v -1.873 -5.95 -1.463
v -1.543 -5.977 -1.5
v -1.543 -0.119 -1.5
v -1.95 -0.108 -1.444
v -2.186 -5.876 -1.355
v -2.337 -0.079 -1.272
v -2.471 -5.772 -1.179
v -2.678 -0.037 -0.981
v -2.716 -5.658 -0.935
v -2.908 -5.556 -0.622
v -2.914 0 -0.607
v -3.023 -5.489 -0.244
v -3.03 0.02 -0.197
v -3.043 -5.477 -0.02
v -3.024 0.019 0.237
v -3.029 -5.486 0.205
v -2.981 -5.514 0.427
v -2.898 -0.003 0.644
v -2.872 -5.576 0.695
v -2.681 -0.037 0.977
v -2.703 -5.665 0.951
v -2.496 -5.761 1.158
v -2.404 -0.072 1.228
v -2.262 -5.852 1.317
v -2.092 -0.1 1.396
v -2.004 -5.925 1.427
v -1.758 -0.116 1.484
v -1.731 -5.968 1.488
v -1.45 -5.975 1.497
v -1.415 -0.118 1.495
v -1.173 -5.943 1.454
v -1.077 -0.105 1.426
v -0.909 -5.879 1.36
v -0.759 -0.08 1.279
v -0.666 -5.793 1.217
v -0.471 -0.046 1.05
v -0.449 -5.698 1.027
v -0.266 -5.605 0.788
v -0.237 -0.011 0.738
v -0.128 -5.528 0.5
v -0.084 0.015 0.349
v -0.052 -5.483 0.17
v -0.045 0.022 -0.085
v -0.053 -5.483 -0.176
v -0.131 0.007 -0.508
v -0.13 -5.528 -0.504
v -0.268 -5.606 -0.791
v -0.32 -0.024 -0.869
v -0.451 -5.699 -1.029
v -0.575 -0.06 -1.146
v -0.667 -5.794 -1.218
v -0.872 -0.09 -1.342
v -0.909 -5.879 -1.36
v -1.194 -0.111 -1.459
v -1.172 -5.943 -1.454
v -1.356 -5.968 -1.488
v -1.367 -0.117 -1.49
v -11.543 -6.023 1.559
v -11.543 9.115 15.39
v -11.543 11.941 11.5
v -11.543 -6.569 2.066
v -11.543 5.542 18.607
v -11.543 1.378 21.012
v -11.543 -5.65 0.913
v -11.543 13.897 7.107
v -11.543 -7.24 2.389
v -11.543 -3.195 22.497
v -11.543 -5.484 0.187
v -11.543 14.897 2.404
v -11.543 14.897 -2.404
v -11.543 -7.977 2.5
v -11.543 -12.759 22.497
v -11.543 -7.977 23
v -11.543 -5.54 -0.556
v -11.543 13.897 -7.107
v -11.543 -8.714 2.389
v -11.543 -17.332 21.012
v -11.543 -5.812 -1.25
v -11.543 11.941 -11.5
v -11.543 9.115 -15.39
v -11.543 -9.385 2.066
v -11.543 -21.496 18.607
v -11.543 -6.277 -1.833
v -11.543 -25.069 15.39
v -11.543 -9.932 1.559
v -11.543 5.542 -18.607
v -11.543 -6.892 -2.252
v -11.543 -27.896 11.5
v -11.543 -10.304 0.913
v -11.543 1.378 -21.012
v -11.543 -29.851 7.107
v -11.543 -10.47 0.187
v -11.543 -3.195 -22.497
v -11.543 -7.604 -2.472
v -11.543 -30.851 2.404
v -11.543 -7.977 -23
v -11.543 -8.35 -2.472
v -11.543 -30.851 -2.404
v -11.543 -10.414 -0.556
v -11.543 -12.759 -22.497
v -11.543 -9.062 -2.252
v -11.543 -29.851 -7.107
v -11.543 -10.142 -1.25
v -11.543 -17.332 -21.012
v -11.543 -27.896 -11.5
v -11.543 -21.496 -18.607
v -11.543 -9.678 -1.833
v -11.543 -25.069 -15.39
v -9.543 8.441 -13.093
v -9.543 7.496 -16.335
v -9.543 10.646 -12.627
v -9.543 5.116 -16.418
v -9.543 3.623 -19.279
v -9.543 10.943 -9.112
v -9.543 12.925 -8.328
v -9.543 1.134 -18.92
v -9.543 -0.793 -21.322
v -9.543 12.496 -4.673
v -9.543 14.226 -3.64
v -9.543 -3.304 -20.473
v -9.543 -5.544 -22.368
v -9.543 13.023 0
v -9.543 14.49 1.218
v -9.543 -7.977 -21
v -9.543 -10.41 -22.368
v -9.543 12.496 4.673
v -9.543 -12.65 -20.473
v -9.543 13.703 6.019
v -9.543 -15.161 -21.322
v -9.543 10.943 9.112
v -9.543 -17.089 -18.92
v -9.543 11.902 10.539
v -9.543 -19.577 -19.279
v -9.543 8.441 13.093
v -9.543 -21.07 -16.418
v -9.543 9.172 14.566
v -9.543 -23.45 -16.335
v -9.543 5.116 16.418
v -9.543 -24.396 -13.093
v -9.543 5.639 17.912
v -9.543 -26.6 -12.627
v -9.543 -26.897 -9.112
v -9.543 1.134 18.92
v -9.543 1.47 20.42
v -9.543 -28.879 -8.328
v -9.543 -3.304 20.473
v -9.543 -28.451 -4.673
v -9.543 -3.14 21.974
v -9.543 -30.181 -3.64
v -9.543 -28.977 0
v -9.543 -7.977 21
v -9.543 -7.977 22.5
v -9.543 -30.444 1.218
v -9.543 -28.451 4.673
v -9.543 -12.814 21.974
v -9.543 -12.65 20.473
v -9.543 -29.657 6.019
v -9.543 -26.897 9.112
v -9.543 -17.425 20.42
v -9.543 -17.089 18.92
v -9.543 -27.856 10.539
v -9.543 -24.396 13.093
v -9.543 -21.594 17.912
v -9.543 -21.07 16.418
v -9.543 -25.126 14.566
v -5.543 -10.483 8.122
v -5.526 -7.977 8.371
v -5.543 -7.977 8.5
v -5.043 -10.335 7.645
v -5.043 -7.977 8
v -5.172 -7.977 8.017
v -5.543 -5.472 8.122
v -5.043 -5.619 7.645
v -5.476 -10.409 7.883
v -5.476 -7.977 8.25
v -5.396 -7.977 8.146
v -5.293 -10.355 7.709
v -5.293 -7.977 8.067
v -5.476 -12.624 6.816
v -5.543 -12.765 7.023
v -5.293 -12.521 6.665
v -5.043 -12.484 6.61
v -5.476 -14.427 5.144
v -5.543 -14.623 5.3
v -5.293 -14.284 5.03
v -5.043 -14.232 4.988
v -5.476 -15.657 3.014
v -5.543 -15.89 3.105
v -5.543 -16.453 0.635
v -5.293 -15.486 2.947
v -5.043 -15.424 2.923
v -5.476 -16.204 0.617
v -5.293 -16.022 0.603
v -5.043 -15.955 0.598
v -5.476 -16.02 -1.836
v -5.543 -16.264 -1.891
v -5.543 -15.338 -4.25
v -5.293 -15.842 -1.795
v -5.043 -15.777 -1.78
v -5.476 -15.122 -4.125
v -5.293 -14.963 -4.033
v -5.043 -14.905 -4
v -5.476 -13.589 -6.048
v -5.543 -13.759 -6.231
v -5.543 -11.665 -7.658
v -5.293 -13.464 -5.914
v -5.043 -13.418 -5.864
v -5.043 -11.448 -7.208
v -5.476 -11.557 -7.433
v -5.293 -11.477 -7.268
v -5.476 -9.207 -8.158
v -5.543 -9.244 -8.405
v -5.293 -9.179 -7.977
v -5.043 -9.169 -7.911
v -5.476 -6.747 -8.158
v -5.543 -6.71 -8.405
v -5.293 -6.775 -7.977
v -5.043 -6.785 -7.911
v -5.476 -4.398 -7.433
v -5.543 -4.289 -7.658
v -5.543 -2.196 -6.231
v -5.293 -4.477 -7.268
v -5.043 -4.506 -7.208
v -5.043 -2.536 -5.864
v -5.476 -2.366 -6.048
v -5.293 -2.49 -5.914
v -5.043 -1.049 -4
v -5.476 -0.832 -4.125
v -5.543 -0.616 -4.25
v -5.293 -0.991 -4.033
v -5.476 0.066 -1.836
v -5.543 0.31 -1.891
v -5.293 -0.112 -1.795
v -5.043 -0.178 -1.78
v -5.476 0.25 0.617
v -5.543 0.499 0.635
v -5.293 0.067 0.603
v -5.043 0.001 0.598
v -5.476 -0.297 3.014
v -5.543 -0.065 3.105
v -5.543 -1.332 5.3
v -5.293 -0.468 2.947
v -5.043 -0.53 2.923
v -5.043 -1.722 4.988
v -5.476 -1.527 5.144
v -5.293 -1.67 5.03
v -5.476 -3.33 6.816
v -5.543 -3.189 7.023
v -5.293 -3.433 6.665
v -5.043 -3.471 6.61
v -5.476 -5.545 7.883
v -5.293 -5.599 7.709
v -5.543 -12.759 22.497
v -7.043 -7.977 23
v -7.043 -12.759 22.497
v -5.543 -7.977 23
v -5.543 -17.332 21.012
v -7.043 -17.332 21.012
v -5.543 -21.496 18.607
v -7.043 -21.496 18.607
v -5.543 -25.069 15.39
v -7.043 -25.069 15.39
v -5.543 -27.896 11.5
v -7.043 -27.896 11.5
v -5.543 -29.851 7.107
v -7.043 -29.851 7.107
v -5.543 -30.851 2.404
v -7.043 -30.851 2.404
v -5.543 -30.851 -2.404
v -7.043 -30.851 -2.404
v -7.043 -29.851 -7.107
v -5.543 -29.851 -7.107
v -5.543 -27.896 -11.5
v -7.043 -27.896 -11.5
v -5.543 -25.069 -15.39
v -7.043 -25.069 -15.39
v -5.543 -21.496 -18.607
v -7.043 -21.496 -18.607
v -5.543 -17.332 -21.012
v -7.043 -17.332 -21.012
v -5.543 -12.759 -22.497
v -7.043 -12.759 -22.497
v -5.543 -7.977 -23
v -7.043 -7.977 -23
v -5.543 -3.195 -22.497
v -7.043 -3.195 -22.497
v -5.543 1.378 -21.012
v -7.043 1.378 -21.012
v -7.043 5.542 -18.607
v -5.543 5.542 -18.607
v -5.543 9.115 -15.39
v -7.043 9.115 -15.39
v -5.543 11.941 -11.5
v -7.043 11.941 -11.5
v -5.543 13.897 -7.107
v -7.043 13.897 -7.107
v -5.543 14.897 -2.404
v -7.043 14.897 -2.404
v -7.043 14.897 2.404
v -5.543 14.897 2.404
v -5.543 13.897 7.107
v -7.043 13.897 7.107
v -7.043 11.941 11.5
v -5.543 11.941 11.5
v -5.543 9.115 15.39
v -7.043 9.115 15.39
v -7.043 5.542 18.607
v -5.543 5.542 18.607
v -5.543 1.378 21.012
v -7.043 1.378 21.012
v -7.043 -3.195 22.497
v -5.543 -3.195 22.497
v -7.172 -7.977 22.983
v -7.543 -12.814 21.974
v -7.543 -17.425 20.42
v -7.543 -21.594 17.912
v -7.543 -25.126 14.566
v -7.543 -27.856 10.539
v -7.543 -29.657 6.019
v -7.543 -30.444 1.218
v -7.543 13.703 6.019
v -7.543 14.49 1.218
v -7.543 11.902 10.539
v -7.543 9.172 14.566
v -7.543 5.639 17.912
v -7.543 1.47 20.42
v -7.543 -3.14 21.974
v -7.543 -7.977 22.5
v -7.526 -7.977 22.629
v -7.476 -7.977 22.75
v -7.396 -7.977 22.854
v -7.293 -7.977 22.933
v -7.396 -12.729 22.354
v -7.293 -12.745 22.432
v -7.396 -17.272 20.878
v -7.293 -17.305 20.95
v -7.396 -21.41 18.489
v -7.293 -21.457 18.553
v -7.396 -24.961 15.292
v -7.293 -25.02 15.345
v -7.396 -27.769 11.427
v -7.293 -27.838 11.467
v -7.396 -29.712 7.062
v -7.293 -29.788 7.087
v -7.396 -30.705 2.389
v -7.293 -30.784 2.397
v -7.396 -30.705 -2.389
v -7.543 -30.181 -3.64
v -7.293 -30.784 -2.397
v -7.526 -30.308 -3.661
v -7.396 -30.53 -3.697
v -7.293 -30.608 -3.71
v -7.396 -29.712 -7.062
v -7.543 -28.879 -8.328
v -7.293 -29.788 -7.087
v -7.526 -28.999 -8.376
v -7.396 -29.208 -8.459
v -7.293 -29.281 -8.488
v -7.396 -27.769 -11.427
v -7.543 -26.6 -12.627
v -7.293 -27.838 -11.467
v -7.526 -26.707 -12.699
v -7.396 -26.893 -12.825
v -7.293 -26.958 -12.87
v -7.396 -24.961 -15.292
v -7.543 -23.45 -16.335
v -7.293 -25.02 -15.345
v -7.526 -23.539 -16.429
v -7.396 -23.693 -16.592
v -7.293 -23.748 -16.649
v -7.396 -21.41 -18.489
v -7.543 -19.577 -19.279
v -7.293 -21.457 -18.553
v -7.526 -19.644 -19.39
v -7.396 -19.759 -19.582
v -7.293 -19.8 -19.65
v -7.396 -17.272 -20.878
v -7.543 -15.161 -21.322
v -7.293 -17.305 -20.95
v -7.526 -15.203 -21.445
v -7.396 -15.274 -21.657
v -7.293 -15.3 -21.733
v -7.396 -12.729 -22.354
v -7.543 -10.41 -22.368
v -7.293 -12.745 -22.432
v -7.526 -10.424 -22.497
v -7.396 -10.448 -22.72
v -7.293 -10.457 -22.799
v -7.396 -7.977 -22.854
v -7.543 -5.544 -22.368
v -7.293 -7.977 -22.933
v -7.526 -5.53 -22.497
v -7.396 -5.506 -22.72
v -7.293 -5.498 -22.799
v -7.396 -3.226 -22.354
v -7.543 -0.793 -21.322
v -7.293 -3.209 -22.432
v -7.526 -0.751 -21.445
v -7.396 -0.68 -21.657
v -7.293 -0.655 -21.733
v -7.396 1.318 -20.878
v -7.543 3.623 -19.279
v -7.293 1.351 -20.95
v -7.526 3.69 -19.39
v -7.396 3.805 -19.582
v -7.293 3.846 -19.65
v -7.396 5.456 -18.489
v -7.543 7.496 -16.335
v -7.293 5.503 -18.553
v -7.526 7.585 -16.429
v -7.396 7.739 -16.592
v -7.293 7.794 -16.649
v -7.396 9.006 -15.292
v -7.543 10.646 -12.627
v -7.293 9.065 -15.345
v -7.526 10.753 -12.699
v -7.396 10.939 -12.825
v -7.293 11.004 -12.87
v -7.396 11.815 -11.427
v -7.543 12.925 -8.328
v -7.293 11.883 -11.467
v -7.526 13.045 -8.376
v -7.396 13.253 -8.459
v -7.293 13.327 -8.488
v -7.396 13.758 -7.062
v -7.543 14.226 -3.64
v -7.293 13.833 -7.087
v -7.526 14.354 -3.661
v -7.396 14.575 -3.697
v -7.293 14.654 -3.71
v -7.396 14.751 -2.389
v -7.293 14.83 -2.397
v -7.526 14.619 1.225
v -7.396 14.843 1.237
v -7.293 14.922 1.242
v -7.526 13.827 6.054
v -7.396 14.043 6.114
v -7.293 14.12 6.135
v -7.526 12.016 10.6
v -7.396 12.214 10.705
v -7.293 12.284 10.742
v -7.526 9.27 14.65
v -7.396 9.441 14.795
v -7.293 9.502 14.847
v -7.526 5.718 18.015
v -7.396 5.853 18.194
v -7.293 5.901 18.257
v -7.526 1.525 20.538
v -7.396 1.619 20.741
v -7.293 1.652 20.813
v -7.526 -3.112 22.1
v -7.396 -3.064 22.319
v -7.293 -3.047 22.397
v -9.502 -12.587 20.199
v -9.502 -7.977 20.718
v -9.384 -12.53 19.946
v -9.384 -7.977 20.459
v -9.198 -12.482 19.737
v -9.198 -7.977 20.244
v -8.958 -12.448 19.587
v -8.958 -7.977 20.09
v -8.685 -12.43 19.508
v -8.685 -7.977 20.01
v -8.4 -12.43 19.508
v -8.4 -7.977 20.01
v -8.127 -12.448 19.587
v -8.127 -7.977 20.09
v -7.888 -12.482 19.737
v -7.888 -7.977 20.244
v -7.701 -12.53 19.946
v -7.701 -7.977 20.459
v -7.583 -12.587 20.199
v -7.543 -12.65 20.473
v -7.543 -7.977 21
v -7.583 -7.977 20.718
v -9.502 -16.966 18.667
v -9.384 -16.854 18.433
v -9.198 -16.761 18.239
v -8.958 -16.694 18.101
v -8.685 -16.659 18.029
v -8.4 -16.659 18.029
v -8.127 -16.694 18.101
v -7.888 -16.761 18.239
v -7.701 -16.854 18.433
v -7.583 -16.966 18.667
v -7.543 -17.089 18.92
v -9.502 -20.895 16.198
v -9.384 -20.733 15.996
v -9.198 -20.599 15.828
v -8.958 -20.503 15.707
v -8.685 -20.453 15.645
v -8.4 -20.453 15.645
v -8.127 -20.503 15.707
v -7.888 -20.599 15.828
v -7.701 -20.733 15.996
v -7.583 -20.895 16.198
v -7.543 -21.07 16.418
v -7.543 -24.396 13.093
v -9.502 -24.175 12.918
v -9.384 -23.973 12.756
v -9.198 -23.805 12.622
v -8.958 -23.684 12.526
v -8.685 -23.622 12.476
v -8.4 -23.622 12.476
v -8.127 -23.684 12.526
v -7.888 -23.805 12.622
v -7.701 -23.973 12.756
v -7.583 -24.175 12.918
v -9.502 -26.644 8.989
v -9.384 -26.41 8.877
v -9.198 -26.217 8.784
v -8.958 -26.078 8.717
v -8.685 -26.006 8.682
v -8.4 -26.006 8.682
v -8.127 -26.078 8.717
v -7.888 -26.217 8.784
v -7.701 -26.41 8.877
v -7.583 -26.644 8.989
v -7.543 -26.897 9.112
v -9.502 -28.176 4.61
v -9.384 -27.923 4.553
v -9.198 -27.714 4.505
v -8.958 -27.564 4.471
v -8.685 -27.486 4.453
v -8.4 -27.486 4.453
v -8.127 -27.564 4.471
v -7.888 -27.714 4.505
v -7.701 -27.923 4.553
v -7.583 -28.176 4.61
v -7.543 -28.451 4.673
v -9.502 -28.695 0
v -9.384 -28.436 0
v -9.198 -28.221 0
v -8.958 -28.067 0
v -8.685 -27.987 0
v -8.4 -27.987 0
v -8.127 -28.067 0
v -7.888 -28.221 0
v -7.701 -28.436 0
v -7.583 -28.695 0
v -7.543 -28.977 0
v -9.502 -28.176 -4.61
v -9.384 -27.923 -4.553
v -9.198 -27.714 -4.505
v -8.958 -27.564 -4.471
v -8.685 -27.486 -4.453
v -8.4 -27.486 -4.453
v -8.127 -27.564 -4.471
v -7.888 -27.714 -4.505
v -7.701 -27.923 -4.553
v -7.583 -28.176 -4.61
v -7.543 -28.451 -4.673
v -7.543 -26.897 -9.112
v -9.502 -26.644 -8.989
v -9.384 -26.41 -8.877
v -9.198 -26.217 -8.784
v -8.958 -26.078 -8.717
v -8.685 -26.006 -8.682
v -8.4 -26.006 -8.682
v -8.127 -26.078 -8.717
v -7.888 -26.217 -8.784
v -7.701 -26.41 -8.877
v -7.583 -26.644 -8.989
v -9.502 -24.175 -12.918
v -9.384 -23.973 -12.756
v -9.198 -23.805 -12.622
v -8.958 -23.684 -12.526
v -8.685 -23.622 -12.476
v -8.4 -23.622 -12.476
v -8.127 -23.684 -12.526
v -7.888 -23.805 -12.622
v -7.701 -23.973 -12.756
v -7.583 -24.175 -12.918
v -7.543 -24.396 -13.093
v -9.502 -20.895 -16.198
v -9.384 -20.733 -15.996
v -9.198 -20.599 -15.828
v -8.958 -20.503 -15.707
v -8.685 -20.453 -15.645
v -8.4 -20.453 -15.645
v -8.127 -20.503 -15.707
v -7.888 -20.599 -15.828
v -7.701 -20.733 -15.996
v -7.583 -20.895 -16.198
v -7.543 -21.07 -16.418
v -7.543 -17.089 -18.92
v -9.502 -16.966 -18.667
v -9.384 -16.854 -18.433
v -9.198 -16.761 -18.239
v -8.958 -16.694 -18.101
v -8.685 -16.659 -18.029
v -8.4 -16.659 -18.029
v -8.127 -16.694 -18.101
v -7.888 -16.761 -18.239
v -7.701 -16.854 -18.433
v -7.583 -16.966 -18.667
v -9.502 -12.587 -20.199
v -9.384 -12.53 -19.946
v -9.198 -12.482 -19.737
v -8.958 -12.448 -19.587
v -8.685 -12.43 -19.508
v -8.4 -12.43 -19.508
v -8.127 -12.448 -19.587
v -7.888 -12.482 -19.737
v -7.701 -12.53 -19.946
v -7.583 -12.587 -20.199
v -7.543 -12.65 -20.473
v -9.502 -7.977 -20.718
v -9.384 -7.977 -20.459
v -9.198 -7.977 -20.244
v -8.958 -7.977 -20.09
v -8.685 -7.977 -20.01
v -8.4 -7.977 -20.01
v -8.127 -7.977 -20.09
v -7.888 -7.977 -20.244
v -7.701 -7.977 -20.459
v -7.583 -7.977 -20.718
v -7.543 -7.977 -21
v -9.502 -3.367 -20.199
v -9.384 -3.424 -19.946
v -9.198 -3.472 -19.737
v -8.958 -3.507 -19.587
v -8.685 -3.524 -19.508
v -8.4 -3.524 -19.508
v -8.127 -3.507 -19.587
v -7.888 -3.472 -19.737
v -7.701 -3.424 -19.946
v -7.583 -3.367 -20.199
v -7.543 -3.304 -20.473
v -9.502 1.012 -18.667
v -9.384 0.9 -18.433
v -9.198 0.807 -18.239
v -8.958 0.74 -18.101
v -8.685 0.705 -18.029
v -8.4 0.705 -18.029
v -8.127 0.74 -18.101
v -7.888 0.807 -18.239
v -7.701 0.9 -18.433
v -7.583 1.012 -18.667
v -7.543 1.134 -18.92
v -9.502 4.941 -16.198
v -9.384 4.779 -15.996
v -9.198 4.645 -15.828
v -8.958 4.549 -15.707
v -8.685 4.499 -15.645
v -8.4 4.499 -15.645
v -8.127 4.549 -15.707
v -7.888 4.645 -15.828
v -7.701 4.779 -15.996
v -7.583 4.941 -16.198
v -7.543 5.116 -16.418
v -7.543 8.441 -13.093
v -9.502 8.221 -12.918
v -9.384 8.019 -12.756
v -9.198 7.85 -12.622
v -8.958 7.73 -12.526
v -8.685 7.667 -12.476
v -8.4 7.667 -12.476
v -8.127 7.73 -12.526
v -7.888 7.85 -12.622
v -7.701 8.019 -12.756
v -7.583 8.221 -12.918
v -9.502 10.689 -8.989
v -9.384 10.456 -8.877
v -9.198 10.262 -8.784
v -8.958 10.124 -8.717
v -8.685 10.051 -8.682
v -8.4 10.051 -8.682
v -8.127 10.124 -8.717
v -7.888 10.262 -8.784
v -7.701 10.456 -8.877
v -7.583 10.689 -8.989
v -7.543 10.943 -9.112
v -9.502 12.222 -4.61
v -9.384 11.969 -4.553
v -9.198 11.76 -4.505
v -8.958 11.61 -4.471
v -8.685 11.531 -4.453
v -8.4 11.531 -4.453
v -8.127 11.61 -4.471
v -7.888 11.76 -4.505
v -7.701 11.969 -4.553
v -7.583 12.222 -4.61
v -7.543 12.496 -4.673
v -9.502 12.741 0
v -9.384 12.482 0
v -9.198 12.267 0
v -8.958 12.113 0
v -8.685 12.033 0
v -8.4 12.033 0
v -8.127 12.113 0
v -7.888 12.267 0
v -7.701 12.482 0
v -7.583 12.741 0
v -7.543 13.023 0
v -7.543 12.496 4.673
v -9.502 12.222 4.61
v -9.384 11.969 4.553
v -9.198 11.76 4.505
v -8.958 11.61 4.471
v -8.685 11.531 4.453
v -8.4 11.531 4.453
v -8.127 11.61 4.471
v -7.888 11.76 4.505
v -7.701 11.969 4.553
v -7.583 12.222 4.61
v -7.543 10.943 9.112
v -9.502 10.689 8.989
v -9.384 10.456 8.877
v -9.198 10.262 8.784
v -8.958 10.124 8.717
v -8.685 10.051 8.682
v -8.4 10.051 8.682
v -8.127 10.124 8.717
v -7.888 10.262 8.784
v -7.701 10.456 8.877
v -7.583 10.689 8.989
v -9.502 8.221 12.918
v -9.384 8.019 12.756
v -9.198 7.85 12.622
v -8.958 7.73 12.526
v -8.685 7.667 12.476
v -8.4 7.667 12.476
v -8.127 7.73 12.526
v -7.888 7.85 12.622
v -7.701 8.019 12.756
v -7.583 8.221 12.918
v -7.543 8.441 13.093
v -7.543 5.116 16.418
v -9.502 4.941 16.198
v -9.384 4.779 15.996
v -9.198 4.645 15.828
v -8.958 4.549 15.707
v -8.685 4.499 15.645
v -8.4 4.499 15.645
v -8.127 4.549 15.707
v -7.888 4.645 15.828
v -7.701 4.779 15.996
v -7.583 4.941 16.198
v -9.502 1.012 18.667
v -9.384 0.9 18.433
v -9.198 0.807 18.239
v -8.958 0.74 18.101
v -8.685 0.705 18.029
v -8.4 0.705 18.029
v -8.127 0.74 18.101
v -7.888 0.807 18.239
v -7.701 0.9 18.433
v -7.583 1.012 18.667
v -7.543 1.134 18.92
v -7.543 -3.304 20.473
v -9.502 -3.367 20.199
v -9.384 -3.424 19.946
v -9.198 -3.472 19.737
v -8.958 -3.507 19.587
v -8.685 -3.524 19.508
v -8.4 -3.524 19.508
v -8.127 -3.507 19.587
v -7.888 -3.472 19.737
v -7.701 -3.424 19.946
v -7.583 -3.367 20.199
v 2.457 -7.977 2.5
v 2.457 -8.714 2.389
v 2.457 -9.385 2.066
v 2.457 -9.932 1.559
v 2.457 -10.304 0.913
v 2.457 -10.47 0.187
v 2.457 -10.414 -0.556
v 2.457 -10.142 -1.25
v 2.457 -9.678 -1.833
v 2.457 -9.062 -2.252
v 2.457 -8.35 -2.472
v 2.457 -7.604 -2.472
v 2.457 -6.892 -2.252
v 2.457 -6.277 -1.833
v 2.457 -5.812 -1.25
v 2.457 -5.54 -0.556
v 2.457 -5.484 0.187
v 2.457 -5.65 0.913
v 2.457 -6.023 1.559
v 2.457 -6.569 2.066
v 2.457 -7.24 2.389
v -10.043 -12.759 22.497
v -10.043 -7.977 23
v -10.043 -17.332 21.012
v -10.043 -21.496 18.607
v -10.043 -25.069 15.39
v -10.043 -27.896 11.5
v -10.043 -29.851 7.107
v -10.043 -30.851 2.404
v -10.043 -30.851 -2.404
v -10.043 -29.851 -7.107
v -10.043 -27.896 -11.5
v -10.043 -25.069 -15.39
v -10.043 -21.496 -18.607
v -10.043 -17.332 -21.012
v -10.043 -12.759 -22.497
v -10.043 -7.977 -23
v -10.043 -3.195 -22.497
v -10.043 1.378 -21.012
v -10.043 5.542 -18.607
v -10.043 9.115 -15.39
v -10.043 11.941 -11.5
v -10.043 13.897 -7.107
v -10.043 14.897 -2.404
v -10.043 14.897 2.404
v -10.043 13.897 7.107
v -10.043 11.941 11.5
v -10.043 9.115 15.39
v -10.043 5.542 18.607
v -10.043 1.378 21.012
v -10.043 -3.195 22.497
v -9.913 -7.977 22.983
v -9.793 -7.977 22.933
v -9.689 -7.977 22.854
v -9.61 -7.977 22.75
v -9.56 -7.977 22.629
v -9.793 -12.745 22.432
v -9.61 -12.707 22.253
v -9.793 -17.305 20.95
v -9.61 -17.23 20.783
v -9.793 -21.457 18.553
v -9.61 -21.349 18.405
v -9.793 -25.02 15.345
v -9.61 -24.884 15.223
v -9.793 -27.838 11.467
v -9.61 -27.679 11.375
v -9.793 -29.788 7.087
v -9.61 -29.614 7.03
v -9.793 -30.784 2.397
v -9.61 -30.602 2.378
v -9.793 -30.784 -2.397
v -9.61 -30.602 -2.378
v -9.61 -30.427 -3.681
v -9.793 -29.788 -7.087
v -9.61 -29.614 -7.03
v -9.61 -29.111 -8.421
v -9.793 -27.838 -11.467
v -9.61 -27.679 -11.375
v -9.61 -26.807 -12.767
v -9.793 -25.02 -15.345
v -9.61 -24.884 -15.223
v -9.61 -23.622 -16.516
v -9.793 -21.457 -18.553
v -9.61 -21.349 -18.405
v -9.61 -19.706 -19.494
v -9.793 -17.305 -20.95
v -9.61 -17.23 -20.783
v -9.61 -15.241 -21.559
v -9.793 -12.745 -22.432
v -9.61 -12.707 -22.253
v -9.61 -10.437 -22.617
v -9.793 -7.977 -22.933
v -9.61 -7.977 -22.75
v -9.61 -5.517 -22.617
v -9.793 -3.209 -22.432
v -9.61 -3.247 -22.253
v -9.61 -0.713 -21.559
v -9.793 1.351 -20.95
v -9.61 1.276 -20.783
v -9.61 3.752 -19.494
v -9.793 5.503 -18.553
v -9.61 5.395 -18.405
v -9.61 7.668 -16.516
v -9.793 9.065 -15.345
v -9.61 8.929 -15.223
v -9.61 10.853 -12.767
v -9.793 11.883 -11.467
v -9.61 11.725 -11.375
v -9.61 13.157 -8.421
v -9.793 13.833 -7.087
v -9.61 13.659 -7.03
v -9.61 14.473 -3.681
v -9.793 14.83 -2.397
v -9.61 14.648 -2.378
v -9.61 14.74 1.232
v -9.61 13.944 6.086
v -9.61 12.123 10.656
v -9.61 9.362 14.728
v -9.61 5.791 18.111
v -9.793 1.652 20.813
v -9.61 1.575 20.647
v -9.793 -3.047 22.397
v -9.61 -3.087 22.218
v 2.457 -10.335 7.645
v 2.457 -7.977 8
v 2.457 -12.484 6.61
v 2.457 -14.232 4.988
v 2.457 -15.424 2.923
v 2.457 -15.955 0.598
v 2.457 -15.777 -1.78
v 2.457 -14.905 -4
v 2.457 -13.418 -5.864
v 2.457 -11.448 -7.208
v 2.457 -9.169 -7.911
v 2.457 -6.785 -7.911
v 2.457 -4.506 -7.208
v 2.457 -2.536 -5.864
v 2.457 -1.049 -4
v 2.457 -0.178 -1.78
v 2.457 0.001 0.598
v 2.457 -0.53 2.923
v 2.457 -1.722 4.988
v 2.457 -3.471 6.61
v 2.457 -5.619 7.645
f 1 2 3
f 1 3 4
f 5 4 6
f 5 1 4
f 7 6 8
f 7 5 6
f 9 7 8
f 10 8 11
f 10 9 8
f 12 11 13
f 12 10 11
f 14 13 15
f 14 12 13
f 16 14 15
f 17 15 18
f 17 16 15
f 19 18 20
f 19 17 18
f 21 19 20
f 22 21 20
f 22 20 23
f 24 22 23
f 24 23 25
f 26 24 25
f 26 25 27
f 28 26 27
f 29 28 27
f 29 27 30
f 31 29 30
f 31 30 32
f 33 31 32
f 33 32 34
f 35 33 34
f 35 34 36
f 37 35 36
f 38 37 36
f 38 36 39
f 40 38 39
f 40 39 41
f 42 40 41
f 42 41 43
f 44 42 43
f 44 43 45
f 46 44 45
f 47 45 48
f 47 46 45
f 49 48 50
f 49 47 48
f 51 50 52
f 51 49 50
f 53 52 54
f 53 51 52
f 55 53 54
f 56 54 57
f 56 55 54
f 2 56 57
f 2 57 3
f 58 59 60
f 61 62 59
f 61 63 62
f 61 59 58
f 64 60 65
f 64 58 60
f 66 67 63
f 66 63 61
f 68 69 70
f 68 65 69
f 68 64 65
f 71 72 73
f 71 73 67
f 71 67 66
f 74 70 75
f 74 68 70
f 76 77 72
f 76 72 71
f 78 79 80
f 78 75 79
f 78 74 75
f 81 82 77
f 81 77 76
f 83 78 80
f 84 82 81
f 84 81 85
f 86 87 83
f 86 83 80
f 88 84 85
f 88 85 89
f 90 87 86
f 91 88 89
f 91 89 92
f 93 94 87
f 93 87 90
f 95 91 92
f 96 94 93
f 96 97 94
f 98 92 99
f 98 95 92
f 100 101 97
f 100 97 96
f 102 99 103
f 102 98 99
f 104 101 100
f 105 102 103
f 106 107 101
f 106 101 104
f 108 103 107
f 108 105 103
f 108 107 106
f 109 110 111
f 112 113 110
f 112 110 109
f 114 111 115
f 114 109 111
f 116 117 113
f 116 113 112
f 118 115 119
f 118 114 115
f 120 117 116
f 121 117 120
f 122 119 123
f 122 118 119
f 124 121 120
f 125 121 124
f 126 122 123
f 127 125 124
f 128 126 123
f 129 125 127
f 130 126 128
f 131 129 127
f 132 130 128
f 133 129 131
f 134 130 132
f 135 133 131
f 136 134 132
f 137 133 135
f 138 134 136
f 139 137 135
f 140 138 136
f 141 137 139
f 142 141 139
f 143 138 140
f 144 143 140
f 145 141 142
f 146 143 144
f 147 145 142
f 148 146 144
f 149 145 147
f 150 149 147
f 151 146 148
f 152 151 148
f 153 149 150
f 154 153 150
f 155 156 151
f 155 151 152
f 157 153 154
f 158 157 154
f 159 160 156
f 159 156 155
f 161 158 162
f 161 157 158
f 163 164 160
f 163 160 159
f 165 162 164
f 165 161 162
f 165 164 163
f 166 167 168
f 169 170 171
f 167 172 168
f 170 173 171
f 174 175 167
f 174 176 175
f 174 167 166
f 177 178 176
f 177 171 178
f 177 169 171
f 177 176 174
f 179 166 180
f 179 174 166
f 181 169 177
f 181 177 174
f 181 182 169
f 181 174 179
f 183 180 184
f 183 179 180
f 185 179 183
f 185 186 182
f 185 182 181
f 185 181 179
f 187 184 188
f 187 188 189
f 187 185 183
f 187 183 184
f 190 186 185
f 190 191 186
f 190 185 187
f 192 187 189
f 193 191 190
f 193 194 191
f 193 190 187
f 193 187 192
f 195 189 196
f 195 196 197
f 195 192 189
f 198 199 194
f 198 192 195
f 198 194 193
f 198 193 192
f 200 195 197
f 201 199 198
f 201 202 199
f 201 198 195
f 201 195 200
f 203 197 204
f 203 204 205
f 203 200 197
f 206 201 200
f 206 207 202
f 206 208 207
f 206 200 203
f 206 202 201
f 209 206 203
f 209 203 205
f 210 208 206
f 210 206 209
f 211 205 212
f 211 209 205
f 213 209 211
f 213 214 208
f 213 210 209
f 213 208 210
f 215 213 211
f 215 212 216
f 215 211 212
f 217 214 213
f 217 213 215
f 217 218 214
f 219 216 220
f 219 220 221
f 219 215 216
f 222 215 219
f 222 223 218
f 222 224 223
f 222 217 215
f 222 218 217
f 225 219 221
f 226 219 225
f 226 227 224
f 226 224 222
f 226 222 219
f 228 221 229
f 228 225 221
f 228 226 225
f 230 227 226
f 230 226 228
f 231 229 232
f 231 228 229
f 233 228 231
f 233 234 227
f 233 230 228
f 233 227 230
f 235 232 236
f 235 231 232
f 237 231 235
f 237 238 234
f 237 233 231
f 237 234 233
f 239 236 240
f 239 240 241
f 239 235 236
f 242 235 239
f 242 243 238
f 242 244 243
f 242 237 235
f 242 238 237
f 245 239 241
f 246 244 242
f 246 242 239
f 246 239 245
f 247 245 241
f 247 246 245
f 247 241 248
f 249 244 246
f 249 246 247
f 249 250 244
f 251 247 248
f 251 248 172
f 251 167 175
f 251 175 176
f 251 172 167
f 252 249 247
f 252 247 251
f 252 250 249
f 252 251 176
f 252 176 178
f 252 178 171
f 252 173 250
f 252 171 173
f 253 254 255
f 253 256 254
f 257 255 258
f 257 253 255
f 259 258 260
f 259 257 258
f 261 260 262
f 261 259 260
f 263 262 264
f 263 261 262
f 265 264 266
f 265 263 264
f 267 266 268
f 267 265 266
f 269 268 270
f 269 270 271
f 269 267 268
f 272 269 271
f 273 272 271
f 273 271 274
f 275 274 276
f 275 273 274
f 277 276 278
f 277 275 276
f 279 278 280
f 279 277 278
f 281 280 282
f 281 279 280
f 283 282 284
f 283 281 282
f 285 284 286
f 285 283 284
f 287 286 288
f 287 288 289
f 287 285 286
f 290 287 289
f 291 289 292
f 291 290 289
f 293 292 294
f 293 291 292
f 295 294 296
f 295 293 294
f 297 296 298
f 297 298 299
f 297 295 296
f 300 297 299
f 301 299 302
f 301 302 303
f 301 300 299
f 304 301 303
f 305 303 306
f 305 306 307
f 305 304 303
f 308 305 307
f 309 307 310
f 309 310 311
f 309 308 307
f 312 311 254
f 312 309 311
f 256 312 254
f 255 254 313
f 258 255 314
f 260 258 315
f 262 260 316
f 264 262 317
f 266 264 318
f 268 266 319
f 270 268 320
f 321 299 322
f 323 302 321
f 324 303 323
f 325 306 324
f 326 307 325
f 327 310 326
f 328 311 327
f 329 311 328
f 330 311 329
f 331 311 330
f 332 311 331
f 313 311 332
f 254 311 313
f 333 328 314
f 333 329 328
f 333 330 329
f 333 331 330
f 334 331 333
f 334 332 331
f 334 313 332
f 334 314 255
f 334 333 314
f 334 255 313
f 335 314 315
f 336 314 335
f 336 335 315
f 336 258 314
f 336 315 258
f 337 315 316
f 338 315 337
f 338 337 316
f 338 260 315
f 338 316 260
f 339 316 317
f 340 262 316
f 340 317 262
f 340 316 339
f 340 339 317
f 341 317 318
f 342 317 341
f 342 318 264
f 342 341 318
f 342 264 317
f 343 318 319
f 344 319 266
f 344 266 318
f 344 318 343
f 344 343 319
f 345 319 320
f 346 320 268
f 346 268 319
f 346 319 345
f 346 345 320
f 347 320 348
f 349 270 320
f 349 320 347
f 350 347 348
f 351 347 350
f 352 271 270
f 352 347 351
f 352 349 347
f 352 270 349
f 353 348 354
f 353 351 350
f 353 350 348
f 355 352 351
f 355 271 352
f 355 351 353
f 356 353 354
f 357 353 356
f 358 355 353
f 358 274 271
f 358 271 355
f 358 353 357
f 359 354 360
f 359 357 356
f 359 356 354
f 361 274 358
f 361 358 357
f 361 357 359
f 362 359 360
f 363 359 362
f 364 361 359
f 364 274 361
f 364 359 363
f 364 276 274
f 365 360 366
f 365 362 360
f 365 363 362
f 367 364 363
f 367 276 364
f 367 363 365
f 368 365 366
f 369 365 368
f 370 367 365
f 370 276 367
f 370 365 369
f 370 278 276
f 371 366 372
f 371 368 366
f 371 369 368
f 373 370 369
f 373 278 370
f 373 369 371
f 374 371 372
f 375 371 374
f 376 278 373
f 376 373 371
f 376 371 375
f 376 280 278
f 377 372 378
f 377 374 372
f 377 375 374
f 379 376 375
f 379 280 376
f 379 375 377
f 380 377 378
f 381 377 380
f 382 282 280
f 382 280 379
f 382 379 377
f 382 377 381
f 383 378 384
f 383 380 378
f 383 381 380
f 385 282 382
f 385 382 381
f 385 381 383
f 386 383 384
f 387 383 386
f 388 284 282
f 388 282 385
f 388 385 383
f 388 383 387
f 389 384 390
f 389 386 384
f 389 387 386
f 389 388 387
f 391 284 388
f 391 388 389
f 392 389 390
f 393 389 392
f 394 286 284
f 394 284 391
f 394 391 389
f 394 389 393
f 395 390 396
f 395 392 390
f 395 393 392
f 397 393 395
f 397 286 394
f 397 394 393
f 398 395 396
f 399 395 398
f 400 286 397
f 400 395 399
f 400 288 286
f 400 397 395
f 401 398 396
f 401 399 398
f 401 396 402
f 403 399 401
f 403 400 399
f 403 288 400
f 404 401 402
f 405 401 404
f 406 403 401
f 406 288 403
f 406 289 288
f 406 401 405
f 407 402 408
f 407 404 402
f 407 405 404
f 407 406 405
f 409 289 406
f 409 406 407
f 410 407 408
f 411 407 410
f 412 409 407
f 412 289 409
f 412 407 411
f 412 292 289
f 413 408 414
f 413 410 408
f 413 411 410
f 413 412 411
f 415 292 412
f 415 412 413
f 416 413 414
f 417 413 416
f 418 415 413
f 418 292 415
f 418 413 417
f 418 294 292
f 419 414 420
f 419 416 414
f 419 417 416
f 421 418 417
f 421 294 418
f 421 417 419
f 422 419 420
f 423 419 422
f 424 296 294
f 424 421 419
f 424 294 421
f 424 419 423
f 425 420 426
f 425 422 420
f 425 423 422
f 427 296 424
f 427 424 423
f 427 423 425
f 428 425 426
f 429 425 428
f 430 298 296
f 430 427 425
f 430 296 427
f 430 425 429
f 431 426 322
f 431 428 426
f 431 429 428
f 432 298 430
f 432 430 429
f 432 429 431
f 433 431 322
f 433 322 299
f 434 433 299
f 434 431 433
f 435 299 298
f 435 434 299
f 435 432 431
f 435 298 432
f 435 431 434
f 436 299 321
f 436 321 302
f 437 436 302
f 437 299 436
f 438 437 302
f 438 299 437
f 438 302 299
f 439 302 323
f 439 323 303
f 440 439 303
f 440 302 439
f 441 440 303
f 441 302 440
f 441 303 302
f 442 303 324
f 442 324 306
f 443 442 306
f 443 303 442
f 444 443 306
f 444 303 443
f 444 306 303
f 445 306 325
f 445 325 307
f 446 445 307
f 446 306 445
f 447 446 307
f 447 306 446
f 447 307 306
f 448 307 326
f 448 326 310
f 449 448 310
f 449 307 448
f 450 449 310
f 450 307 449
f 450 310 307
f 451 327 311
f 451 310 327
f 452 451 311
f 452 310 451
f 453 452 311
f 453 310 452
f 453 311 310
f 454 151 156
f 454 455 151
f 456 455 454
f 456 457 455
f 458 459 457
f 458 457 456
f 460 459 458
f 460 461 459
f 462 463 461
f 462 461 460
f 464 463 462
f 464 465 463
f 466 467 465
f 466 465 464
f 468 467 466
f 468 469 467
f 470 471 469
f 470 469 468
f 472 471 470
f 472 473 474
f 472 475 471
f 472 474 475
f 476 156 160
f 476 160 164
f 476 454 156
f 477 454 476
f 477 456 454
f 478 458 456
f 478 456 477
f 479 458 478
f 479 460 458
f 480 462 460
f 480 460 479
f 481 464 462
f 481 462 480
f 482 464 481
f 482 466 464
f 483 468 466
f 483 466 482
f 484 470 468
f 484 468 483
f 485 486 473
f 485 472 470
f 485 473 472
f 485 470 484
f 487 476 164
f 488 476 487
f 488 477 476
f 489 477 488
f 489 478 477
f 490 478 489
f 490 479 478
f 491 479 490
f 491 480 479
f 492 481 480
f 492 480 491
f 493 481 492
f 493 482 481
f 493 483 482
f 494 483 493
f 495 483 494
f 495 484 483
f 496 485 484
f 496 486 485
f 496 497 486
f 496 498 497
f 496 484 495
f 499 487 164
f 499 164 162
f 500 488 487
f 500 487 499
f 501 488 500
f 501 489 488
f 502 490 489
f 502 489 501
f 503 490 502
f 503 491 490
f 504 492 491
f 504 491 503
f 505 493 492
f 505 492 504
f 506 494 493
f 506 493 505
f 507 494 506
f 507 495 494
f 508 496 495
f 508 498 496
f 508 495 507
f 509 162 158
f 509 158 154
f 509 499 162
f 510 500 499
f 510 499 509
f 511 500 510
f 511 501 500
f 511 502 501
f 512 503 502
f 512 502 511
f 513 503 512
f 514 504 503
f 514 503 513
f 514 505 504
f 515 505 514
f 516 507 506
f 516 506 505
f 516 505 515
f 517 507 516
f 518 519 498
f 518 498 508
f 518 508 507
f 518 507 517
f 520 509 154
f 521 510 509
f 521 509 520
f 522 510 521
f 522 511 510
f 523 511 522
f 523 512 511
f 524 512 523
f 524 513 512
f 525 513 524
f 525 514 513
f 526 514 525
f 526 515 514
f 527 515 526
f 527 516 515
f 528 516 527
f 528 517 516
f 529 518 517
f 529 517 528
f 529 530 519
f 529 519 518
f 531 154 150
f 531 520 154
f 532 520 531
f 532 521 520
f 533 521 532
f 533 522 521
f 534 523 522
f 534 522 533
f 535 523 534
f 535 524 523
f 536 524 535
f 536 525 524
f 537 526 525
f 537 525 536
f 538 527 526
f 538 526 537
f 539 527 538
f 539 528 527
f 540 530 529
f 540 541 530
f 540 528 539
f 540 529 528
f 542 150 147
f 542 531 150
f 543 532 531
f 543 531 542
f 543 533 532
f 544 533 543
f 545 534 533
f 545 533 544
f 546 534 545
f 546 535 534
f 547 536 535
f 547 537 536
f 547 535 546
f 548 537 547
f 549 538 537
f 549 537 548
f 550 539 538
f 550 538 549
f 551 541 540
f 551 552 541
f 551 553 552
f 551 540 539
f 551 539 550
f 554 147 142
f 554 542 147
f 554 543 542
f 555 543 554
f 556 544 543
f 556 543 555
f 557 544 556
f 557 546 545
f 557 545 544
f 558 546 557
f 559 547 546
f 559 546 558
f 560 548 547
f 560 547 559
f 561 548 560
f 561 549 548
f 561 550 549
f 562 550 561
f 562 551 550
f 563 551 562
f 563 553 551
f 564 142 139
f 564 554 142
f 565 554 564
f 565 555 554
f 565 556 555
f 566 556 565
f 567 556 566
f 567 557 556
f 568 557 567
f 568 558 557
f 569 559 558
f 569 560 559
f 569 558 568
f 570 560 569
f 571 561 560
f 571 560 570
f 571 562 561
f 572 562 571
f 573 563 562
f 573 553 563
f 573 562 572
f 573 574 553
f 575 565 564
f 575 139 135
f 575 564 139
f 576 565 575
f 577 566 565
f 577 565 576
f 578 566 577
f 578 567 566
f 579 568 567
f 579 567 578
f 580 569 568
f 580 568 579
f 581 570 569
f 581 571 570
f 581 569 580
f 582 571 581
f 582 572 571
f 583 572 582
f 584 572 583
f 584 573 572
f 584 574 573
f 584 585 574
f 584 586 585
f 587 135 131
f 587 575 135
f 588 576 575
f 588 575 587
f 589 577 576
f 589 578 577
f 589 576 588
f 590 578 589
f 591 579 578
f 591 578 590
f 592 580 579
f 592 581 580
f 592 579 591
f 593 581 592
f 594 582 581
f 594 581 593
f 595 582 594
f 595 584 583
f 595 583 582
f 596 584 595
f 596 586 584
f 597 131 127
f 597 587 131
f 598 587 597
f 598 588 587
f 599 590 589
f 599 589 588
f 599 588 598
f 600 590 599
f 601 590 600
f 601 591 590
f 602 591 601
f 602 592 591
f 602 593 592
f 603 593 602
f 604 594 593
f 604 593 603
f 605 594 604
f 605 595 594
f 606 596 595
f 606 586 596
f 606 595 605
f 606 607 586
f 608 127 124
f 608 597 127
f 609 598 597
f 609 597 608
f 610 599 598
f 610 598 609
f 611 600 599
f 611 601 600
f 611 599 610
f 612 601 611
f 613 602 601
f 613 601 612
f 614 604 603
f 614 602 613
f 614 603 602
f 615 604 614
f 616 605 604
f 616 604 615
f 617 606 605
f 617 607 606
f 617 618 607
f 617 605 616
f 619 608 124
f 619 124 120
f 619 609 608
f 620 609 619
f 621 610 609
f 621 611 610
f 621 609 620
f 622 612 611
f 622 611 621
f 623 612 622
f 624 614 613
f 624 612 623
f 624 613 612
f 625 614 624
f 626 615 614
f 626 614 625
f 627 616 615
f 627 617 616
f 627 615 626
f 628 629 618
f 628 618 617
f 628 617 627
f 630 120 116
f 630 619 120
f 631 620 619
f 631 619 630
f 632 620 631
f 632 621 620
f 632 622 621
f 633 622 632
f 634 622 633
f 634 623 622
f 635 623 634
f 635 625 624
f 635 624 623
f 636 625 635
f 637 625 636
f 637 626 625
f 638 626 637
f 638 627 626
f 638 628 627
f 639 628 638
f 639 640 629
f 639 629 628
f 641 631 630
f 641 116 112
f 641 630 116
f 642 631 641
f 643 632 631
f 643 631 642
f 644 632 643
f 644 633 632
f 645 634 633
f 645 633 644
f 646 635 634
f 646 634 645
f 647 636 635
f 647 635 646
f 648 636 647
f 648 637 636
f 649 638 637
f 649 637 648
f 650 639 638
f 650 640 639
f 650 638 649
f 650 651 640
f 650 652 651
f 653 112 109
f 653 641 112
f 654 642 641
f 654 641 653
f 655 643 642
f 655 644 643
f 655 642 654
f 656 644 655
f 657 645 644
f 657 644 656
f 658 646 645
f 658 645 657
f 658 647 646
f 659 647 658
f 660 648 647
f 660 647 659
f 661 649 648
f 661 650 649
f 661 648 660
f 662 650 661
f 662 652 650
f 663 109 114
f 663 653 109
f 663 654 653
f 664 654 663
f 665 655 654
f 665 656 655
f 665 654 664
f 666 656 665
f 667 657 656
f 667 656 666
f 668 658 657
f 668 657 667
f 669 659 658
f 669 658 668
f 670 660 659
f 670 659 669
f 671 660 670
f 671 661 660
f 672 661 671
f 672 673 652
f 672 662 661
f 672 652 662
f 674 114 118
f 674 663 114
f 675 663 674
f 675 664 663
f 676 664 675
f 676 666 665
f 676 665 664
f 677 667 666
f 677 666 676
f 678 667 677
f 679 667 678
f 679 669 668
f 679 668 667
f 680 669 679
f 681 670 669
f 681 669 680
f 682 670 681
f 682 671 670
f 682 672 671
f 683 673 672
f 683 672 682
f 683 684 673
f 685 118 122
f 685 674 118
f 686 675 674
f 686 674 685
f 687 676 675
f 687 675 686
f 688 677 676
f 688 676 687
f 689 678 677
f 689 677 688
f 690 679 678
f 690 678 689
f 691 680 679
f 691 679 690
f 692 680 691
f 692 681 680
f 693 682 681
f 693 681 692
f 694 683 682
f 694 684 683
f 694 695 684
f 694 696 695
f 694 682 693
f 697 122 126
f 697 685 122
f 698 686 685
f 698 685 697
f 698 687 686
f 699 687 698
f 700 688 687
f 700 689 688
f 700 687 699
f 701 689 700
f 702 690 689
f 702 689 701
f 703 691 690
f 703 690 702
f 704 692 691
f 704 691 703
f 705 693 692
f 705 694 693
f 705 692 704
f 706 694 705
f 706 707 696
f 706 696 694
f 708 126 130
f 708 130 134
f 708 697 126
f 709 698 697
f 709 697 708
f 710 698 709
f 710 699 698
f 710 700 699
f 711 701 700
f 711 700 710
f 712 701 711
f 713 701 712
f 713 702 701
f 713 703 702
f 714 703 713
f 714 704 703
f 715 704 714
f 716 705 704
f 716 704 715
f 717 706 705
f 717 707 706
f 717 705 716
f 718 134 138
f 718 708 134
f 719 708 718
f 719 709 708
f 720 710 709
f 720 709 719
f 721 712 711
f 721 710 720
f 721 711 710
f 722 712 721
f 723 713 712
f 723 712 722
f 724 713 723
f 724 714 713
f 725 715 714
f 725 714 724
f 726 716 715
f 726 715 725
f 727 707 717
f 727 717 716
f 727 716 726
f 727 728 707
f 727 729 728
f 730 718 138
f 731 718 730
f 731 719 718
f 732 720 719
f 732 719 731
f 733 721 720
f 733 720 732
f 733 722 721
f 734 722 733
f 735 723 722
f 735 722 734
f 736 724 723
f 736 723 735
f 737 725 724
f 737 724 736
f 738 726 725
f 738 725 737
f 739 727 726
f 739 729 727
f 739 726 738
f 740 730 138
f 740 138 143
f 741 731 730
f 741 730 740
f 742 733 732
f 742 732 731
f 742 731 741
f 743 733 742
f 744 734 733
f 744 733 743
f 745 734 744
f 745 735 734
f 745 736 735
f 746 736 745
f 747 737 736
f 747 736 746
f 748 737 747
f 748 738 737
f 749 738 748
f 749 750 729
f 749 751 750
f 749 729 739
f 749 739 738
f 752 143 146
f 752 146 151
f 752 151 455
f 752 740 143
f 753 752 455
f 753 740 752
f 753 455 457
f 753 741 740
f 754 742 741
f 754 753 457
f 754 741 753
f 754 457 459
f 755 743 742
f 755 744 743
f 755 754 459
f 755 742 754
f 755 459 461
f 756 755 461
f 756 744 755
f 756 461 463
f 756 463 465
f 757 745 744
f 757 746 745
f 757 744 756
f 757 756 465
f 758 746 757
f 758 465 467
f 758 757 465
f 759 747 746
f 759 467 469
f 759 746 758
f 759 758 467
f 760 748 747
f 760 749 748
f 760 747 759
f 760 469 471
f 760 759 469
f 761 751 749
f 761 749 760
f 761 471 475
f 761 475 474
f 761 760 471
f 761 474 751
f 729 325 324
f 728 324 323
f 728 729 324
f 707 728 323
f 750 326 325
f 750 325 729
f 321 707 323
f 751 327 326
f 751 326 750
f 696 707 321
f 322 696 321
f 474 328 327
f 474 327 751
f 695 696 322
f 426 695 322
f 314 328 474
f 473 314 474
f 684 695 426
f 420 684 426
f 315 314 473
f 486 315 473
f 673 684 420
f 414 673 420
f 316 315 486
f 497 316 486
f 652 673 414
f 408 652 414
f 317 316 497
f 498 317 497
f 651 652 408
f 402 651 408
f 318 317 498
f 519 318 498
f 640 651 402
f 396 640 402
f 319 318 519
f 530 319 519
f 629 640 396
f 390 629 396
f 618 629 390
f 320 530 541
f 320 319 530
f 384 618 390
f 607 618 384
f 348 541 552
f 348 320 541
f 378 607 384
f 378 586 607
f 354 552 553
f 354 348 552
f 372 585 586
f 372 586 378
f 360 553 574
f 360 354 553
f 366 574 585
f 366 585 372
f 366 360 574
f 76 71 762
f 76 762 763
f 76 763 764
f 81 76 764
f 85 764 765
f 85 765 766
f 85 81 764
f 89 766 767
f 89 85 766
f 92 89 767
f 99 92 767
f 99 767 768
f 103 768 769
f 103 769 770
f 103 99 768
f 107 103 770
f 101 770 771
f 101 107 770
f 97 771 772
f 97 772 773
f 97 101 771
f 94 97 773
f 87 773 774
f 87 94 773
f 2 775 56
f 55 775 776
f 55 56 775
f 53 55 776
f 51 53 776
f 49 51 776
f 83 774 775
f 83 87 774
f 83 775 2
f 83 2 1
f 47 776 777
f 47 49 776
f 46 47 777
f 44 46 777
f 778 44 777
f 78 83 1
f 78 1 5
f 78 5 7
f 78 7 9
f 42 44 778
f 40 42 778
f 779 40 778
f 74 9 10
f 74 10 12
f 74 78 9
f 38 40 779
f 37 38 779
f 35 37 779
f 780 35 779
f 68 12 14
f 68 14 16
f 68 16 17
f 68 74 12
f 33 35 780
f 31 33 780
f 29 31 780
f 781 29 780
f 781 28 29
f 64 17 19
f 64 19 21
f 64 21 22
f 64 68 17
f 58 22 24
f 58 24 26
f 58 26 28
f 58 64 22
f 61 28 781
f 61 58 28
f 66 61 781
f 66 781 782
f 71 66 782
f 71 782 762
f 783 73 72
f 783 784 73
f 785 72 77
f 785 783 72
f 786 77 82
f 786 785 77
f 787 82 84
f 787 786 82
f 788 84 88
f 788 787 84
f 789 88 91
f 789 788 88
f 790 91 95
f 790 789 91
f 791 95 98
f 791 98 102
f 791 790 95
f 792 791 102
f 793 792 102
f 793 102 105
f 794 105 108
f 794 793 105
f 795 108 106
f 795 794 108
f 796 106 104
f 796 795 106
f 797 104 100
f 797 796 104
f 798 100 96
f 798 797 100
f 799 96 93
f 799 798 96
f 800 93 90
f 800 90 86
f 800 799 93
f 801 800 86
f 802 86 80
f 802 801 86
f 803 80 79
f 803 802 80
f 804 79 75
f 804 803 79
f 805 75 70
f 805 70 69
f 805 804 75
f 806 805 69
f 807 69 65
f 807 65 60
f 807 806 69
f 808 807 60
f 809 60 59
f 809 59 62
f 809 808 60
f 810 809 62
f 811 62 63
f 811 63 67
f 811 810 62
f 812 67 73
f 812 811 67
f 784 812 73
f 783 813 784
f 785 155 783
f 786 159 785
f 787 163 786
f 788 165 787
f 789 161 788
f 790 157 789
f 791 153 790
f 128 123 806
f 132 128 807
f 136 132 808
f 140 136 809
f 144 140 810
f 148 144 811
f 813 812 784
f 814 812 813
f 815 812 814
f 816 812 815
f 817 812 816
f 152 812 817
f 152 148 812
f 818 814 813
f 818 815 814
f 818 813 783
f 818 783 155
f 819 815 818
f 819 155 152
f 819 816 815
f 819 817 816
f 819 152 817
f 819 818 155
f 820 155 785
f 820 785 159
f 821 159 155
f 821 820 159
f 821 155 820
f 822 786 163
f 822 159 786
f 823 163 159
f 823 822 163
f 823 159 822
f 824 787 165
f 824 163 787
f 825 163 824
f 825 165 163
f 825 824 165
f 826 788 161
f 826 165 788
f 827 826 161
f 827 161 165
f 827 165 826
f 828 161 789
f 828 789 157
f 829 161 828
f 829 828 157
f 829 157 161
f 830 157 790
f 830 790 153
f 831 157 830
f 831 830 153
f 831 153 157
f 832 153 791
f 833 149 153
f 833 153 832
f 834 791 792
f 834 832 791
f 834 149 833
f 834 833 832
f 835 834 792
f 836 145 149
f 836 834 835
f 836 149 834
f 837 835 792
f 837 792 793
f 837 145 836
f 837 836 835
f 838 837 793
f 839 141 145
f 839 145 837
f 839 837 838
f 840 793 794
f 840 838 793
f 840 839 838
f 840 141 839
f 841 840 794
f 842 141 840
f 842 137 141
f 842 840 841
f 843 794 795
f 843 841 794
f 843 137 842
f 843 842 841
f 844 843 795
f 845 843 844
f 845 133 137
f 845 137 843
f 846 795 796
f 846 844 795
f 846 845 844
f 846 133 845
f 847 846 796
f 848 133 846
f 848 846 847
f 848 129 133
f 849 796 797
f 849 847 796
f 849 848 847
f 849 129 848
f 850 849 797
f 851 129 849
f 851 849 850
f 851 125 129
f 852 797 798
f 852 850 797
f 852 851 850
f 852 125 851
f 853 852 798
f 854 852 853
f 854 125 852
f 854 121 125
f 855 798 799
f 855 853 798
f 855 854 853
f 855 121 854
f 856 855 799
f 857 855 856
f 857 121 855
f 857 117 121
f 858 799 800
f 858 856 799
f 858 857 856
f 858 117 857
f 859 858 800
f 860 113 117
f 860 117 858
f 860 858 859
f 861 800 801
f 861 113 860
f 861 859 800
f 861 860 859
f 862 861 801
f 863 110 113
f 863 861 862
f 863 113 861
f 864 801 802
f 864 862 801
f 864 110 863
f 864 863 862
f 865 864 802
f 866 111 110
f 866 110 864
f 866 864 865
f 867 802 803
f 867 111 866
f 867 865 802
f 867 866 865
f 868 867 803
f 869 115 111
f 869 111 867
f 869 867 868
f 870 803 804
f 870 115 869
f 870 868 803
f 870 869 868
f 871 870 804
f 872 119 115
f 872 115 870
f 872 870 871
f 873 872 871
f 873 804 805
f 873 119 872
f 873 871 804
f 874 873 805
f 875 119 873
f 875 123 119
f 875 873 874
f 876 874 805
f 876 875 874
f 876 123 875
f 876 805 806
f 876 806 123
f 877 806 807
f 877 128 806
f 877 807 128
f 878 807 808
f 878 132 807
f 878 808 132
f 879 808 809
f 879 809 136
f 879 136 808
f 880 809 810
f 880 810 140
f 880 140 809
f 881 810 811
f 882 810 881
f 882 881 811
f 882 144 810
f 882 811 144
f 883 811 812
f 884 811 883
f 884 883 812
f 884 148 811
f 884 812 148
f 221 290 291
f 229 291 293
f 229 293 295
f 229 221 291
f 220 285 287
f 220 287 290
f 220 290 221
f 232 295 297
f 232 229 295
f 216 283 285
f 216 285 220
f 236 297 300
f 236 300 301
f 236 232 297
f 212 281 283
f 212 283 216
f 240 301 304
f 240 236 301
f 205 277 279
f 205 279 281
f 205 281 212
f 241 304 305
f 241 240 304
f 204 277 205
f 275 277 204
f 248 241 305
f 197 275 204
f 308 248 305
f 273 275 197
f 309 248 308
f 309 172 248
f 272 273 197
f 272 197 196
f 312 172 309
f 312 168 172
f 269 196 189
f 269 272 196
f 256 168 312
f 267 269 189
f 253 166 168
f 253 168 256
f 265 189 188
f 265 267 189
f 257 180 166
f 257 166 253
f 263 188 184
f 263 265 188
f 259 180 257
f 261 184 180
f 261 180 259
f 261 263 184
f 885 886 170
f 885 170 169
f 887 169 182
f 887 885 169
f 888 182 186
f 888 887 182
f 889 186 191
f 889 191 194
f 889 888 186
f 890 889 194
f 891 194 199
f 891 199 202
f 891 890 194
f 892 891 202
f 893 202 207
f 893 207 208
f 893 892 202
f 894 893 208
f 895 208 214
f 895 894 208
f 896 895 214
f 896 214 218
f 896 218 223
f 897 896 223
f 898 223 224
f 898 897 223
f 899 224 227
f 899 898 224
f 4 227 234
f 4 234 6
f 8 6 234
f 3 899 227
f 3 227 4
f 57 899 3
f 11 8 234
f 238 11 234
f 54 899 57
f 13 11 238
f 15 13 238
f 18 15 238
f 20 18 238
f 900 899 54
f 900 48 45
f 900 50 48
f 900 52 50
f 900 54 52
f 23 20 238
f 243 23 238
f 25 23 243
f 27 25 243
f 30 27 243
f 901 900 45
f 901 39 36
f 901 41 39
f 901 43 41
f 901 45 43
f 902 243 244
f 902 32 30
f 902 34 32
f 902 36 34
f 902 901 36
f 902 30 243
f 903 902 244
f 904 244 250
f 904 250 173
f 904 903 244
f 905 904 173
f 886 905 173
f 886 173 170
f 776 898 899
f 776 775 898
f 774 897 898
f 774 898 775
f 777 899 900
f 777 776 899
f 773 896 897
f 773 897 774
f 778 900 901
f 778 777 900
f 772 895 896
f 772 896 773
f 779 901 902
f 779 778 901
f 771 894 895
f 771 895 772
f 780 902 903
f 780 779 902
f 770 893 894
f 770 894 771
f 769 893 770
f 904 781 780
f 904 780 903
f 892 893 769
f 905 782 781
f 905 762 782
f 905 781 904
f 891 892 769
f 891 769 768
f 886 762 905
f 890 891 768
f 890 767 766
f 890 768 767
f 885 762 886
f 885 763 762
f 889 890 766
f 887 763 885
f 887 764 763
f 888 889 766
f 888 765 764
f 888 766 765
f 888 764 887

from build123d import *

# Parameters (mm, degrees)
CUT_EXTRUDE3_DEPTH      = 2
CUT_EXTRUDE3_DEPTH_BACK = 8
SKETCH7_R               = 1.5


with BuildPart() as part:
    # Sketch1 → Revolve1 (revolve)
    with BuildSketch(Plane.XY, mode=Mode.PRIVATE) as revolve1_sk:
        with BuildLine():
            Line((-11.54268079, 15.022902393), (-10.04268079, 15.022902393))
            ThreePointArc((-10.04268079, 15.022902393), (-9.689127399, 14.876455783), (-9.54268079, 14.522902393))
            Line((-9.54268079, 14.522902393), (-9.54268079, 13.022902453))
            ThreePointArc((-9.54268079, 13.022902453), (-8.54268079, 12.022902453), (-7.54268079, 13.022902453))
            Line((-7.54268079, 13.022902453), (-7.54268079, 14.522902393))
            ThreePointArc((-7.54268079, 14.522902393), (-7.396234181, 14.876455783), (-7.04268079, 15.022902393))
            Line((-7.04268079, 15.022902393), (-5.54268079, 15.022902393))
            Line((-5.54268079, 15.022902393), (-5.54268079, 0.522902393))
            ThreePointArc((-5.54268079, 0.522902393), (-5.396234181, 0.169349002), (-5.04268079, 0.022902393))
            Line((-5.04268079, 0.022902393), (2.45731921, 0.022902393))
            Line((2.45731921, 0.022902393), (2.45731921, -5.477097607))
            Line((2.45731921, -5.477097607), (-11.54268079, -5.477097607))
            Line((-11.54268079, -5.477097607), (-11.54268079, 15.022902393))
        make_face()
    revolve(revolve1_sk.sketch.rotate(Axis((-11.54268079, -7.977097607, 0), (1, 0, 0)), 90), axis=Axis((-11.54268079, -7.977097607, 0), (1, 0, 0)))

    # Sketch7 → Cut-Extrude3 (cut, two sides: drawn at the far end of the back side and taken through both)
    with BuildSketch(Plane(origin=(0, 0, 0), x_dir=(1, 0, 0), z_dir=(0, 1, 0)).offset(-CUT_EXTRUDE3_DEPTH_BACK)):
        with Locations(Location((-1.54268079, 0, 0), (0, 0, 90))):
            Circle(SKETCH7_R)
    extrude(amount=CUT_EXTRUDE3_DEPTH + CUT_EXTRUDE3_DEPTH_BACK, mode=Mode.SUBTRACT)


solid = part.part
